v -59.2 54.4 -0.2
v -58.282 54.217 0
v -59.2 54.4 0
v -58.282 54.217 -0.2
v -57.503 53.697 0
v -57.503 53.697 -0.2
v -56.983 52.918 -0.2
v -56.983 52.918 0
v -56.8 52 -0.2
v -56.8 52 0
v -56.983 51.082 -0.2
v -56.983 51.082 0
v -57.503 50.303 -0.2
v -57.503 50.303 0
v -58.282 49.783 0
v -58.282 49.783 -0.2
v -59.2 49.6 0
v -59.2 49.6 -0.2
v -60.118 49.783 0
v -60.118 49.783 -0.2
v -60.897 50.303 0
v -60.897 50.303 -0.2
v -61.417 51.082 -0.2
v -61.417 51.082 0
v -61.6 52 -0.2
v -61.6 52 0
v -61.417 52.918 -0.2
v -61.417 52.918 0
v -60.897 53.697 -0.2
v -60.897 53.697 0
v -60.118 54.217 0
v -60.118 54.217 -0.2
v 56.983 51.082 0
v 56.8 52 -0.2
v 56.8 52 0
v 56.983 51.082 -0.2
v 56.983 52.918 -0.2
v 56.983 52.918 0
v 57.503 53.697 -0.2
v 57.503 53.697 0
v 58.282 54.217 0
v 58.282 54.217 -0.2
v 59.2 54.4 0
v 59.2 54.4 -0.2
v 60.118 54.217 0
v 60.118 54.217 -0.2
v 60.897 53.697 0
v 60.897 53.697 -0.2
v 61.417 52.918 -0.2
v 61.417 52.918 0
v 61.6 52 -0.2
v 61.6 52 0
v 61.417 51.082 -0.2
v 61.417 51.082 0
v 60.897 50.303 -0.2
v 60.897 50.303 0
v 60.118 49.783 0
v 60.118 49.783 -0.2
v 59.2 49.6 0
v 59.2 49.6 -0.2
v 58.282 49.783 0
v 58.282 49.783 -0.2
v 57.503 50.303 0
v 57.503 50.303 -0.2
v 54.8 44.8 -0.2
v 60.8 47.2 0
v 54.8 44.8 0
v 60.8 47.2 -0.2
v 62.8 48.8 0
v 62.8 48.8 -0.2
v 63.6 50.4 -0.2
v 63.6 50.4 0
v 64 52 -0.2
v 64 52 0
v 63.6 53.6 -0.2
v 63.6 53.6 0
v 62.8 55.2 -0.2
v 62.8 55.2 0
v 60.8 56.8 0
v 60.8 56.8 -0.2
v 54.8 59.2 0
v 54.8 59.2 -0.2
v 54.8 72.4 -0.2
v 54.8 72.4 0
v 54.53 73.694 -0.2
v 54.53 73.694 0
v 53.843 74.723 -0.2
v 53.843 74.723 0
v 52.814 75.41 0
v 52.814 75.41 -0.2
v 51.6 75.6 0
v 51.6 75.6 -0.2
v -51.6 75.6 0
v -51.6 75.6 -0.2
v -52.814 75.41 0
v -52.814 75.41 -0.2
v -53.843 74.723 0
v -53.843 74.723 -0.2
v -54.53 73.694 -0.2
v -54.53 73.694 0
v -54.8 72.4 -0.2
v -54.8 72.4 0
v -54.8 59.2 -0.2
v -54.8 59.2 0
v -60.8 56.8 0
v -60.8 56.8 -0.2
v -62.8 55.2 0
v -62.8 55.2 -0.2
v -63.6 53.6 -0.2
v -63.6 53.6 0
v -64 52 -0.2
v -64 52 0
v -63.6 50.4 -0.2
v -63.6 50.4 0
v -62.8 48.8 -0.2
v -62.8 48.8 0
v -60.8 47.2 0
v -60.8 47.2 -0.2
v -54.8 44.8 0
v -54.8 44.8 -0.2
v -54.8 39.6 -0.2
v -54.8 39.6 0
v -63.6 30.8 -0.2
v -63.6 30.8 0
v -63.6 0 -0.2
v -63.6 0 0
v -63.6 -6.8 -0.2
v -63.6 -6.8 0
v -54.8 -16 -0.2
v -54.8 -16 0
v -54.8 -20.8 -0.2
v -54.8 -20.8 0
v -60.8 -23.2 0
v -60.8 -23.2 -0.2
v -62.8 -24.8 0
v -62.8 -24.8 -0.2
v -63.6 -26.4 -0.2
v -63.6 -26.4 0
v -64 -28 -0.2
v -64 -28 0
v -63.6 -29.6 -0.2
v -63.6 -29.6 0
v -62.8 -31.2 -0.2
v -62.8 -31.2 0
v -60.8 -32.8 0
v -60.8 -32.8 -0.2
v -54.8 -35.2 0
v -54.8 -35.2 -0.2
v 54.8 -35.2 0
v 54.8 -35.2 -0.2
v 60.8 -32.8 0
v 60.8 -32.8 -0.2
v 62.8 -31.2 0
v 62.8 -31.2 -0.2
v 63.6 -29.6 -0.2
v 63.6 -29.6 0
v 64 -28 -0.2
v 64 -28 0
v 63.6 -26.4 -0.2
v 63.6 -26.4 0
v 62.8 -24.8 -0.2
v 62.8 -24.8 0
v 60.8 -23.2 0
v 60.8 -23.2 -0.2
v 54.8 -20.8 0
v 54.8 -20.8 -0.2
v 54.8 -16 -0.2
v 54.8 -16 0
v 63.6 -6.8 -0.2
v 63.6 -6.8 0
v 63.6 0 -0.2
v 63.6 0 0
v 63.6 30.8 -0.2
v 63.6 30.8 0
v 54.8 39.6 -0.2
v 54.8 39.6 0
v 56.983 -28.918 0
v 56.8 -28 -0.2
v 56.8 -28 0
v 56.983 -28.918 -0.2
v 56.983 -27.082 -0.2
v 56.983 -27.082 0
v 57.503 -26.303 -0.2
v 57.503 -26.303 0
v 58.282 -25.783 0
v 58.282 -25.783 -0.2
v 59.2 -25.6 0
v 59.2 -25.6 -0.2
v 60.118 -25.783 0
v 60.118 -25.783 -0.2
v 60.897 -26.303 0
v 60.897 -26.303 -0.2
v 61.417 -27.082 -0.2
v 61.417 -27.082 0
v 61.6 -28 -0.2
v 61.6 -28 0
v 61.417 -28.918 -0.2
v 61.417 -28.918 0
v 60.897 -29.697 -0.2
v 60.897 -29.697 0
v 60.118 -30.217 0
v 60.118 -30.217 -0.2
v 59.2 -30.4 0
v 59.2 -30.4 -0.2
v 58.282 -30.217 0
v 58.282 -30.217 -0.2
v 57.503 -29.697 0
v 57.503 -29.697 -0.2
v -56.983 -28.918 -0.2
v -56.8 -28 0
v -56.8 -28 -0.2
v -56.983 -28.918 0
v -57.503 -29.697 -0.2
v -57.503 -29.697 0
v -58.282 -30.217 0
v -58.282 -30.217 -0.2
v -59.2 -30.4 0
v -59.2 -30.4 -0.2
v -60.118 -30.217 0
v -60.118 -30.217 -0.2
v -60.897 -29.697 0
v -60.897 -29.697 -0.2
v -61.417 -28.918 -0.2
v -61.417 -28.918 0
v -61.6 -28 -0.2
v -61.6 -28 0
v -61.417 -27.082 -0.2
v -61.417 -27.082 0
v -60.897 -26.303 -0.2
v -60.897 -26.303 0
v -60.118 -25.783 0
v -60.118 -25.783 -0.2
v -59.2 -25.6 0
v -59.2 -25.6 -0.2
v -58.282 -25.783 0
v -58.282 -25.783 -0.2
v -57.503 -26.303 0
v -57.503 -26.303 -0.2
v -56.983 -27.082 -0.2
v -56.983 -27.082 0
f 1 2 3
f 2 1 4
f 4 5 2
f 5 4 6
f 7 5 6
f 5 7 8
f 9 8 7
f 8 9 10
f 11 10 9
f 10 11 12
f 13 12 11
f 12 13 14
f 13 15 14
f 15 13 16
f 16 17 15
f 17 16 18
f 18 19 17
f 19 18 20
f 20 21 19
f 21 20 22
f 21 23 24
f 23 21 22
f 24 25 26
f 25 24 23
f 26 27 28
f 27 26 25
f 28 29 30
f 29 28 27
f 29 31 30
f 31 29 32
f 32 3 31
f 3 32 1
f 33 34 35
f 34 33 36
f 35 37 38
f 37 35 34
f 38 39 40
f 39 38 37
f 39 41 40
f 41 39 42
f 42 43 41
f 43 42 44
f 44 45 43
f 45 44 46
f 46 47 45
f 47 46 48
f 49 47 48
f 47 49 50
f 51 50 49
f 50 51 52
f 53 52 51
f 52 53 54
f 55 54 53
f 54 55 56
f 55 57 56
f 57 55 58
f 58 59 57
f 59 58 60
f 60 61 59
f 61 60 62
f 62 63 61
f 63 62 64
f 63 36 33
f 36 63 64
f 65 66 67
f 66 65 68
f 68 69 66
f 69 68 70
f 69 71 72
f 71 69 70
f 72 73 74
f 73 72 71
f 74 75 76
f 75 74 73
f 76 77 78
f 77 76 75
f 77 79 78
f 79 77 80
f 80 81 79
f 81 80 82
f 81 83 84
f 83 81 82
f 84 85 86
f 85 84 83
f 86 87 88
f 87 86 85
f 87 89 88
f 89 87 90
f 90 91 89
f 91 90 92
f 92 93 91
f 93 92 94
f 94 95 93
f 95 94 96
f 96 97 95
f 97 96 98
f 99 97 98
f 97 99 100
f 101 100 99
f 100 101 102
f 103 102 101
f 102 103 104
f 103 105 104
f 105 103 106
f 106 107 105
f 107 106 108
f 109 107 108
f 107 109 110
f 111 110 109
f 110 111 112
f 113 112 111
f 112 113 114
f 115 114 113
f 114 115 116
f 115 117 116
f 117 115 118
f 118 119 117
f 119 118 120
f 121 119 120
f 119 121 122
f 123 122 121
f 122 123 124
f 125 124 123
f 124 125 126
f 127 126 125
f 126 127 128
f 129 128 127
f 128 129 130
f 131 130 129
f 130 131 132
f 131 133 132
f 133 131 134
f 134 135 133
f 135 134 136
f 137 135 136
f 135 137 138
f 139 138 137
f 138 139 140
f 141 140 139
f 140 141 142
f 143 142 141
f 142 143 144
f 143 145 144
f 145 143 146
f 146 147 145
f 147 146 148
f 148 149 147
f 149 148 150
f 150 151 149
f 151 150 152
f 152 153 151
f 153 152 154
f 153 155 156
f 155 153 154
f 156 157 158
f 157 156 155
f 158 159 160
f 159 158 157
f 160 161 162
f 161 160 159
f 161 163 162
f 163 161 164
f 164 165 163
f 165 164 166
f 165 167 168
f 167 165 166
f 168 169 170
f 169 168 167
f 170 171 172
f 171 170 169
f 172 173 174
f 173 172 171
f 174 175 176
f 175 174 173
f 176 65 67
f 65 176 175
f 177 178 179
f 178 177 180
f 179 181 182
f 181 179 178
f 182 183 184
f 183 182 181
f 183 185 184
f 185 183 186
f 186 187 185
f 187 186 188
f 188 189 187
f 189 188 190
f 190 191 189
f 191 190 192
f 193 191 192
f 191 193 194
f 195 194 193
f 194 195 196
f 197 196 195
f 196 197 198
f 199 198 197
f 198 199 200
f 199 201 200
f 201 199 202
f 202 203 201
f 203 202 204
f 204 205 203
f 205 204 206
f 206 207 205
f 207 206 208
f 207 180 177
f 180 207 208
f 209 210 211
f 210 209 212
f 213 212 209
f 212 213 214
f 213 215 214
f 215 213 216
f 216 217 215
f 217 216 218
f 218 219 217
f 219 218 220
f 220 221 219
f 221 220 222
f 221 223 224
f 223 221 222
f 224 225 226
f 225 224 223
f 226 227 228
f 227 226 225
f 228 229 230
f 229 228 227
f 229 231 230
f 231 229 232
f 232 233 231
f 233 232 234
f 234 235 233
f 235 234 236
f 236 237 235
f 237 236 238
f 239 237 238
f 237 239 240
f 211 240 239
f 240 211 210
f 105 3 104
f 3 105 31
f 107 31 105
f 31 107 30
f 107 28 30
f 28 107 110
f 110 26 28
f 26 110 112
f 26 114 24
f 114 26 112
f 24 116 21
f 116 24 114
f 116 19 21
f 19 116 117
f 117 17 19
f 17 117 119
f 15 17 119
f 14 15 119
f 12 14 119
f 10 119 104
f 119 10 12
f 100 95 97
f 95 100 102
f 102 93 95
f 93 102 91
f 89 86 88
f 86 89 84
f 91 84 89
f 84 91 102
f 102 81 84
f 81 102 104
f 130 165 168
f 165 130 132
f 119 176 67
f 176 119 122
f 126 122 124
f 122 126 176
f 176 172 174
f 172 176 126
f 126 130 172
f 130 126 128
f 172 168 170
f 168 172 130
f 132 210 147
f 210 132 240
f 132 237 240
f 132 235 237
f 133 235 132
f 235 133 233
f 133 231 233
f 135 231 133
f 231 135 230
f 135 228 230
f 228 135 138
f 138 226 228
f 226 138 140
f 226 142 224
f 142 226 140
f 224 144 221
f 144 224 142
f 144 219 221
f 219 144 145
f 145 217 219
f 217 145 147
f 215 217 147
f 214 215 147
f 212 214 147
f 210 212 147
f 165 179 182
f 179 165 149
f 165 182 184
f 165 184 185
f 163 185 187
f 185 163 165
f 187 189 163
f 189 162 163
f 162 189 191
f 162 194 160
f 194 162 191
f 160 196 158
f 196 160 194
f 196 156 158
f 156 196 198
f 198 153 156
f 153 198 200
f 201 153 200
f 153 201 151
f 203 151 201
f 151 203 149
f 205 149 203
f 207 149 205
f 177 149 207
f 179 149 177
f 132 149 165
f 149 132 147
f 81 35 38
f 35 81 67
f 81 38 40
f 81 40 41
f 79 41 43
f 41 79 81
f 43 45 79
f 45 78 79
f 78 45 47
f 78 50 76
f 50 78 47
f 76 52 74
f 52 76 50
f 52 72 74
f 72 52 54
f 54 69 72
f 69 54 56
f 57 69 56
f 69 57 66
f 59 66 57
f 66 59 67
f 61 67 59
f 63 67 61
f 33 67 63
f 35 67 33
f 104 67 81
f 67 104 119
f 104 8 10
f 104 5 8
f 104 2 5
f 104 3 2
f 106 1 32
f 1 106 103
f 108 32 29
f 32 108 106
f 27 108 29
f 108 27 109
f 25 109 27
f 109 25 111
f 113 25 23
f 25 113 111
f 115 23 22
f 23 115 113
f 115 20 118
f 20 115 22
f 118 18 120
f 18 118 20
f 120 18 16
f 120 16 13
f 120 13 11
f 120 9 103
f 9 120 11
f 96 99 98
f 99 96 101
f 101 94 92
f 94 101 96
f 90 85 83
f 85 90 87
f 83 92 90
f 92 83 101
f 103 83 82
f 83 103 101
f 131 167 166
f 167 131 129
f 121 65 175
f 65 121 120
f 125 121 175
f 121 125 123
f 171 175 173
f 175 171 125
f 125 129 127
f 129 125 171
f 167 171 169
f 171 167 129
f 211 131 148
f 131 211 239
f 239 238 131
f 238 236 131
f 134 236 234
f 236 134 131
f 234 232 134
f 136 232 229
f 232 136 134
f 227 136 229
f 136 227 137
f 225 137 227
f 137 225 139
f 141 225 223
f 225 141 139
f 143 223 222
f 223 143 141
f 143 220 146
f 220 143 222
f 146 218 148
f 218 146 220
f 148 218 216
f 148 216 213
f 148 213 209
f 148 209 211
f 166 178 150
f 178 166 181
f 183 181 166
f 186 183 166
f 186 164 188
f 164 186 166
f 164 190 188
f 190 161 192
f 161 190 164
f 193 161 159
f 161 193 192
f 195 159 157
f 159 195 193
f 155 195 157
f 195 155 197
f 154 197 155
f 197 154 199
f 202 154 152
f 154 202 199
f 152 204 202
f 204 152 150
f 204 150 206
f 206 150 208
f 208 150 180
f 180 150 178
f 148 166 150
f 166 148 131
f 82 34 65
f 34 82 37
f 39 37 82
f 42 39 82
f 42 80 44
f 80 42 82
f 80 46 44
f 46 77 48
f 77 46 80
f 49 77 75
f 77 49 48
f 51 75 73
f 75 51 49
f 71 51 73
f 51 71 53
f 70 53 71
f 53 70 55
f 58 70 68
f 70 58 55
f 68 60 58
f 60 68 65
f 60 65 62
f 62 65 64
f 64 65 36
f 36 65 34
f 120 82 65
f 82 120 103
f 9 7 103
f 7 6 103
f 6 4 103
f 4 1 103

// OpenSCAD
use <../lib.scad>
use <s/u9331s01.scad>
use <s/u9331s02.scad>
$fa=1; $fs=0.2;
function ldraw_lib__u9331(realsolid=false) = [
// 0 Cardboard Ramp 16 x 14
// 0 Name: u9331.dat
// 0 Author: Philippe Hurbain [Philo]
// 0 !LDRAW_ORG Part UPDATE 2019-01
// 0 !LICENSE Licensed under CC BY 2.0 and CC BY 4.0 : see CAreadme.txt
// 
// 0 BFC CERTIFY CCW
  [0,"BFC","CERTIFY"],
  [0,"BFC","CCW"],
// 
// 0 !CATEGORY Sheet Cardboard
// 
// 0 !HISTORY 2018-01-30 [PTadmin] Official Update 2018-01
// 0 !HISTORY 2019-01-25 [cwdee] Update category
// 0 !HISTORY 2019-06-28 [PTadmin] Official Update 2019-01
// 
// 
// 1 16 0 0 0 1 0 0 0 1 0 0 0 1 s\u9331s01.dat
  [1,16,0,0,0,1,0,0,0,1,0,0,0,1, ldraw_lib__s__u9331s01(realsolid)],
// 1 16 0 0 0 1 0 0 0 1 0 0 0 1 s\u9331s02.dat
  [1,16,0,0,0,1,0,0,0,1,0,0,0,1, ldraw_lib__s__u9331s02(realsolid)],
// 1 16 0 0.5 0 1 0 0 0 -1 0 0 0 1 s\u9331s02.dat
  [1,16,0,0.5,0,1,0,0,0,-1,0,0,0,1, ldraw_lib__s__u9331s02(realsolid)],
];
module ldraw_lib__u9331(step=0, col=false, unit=2/5, alt=false, line=0.2, solid=!$preview)
    makepoly(ldraw_lib__u9331(solid), step=step, col=col, unit=unit, alt=alt, line=line, solid=solid);
ldraw_lib__u9331(line=0.2);
